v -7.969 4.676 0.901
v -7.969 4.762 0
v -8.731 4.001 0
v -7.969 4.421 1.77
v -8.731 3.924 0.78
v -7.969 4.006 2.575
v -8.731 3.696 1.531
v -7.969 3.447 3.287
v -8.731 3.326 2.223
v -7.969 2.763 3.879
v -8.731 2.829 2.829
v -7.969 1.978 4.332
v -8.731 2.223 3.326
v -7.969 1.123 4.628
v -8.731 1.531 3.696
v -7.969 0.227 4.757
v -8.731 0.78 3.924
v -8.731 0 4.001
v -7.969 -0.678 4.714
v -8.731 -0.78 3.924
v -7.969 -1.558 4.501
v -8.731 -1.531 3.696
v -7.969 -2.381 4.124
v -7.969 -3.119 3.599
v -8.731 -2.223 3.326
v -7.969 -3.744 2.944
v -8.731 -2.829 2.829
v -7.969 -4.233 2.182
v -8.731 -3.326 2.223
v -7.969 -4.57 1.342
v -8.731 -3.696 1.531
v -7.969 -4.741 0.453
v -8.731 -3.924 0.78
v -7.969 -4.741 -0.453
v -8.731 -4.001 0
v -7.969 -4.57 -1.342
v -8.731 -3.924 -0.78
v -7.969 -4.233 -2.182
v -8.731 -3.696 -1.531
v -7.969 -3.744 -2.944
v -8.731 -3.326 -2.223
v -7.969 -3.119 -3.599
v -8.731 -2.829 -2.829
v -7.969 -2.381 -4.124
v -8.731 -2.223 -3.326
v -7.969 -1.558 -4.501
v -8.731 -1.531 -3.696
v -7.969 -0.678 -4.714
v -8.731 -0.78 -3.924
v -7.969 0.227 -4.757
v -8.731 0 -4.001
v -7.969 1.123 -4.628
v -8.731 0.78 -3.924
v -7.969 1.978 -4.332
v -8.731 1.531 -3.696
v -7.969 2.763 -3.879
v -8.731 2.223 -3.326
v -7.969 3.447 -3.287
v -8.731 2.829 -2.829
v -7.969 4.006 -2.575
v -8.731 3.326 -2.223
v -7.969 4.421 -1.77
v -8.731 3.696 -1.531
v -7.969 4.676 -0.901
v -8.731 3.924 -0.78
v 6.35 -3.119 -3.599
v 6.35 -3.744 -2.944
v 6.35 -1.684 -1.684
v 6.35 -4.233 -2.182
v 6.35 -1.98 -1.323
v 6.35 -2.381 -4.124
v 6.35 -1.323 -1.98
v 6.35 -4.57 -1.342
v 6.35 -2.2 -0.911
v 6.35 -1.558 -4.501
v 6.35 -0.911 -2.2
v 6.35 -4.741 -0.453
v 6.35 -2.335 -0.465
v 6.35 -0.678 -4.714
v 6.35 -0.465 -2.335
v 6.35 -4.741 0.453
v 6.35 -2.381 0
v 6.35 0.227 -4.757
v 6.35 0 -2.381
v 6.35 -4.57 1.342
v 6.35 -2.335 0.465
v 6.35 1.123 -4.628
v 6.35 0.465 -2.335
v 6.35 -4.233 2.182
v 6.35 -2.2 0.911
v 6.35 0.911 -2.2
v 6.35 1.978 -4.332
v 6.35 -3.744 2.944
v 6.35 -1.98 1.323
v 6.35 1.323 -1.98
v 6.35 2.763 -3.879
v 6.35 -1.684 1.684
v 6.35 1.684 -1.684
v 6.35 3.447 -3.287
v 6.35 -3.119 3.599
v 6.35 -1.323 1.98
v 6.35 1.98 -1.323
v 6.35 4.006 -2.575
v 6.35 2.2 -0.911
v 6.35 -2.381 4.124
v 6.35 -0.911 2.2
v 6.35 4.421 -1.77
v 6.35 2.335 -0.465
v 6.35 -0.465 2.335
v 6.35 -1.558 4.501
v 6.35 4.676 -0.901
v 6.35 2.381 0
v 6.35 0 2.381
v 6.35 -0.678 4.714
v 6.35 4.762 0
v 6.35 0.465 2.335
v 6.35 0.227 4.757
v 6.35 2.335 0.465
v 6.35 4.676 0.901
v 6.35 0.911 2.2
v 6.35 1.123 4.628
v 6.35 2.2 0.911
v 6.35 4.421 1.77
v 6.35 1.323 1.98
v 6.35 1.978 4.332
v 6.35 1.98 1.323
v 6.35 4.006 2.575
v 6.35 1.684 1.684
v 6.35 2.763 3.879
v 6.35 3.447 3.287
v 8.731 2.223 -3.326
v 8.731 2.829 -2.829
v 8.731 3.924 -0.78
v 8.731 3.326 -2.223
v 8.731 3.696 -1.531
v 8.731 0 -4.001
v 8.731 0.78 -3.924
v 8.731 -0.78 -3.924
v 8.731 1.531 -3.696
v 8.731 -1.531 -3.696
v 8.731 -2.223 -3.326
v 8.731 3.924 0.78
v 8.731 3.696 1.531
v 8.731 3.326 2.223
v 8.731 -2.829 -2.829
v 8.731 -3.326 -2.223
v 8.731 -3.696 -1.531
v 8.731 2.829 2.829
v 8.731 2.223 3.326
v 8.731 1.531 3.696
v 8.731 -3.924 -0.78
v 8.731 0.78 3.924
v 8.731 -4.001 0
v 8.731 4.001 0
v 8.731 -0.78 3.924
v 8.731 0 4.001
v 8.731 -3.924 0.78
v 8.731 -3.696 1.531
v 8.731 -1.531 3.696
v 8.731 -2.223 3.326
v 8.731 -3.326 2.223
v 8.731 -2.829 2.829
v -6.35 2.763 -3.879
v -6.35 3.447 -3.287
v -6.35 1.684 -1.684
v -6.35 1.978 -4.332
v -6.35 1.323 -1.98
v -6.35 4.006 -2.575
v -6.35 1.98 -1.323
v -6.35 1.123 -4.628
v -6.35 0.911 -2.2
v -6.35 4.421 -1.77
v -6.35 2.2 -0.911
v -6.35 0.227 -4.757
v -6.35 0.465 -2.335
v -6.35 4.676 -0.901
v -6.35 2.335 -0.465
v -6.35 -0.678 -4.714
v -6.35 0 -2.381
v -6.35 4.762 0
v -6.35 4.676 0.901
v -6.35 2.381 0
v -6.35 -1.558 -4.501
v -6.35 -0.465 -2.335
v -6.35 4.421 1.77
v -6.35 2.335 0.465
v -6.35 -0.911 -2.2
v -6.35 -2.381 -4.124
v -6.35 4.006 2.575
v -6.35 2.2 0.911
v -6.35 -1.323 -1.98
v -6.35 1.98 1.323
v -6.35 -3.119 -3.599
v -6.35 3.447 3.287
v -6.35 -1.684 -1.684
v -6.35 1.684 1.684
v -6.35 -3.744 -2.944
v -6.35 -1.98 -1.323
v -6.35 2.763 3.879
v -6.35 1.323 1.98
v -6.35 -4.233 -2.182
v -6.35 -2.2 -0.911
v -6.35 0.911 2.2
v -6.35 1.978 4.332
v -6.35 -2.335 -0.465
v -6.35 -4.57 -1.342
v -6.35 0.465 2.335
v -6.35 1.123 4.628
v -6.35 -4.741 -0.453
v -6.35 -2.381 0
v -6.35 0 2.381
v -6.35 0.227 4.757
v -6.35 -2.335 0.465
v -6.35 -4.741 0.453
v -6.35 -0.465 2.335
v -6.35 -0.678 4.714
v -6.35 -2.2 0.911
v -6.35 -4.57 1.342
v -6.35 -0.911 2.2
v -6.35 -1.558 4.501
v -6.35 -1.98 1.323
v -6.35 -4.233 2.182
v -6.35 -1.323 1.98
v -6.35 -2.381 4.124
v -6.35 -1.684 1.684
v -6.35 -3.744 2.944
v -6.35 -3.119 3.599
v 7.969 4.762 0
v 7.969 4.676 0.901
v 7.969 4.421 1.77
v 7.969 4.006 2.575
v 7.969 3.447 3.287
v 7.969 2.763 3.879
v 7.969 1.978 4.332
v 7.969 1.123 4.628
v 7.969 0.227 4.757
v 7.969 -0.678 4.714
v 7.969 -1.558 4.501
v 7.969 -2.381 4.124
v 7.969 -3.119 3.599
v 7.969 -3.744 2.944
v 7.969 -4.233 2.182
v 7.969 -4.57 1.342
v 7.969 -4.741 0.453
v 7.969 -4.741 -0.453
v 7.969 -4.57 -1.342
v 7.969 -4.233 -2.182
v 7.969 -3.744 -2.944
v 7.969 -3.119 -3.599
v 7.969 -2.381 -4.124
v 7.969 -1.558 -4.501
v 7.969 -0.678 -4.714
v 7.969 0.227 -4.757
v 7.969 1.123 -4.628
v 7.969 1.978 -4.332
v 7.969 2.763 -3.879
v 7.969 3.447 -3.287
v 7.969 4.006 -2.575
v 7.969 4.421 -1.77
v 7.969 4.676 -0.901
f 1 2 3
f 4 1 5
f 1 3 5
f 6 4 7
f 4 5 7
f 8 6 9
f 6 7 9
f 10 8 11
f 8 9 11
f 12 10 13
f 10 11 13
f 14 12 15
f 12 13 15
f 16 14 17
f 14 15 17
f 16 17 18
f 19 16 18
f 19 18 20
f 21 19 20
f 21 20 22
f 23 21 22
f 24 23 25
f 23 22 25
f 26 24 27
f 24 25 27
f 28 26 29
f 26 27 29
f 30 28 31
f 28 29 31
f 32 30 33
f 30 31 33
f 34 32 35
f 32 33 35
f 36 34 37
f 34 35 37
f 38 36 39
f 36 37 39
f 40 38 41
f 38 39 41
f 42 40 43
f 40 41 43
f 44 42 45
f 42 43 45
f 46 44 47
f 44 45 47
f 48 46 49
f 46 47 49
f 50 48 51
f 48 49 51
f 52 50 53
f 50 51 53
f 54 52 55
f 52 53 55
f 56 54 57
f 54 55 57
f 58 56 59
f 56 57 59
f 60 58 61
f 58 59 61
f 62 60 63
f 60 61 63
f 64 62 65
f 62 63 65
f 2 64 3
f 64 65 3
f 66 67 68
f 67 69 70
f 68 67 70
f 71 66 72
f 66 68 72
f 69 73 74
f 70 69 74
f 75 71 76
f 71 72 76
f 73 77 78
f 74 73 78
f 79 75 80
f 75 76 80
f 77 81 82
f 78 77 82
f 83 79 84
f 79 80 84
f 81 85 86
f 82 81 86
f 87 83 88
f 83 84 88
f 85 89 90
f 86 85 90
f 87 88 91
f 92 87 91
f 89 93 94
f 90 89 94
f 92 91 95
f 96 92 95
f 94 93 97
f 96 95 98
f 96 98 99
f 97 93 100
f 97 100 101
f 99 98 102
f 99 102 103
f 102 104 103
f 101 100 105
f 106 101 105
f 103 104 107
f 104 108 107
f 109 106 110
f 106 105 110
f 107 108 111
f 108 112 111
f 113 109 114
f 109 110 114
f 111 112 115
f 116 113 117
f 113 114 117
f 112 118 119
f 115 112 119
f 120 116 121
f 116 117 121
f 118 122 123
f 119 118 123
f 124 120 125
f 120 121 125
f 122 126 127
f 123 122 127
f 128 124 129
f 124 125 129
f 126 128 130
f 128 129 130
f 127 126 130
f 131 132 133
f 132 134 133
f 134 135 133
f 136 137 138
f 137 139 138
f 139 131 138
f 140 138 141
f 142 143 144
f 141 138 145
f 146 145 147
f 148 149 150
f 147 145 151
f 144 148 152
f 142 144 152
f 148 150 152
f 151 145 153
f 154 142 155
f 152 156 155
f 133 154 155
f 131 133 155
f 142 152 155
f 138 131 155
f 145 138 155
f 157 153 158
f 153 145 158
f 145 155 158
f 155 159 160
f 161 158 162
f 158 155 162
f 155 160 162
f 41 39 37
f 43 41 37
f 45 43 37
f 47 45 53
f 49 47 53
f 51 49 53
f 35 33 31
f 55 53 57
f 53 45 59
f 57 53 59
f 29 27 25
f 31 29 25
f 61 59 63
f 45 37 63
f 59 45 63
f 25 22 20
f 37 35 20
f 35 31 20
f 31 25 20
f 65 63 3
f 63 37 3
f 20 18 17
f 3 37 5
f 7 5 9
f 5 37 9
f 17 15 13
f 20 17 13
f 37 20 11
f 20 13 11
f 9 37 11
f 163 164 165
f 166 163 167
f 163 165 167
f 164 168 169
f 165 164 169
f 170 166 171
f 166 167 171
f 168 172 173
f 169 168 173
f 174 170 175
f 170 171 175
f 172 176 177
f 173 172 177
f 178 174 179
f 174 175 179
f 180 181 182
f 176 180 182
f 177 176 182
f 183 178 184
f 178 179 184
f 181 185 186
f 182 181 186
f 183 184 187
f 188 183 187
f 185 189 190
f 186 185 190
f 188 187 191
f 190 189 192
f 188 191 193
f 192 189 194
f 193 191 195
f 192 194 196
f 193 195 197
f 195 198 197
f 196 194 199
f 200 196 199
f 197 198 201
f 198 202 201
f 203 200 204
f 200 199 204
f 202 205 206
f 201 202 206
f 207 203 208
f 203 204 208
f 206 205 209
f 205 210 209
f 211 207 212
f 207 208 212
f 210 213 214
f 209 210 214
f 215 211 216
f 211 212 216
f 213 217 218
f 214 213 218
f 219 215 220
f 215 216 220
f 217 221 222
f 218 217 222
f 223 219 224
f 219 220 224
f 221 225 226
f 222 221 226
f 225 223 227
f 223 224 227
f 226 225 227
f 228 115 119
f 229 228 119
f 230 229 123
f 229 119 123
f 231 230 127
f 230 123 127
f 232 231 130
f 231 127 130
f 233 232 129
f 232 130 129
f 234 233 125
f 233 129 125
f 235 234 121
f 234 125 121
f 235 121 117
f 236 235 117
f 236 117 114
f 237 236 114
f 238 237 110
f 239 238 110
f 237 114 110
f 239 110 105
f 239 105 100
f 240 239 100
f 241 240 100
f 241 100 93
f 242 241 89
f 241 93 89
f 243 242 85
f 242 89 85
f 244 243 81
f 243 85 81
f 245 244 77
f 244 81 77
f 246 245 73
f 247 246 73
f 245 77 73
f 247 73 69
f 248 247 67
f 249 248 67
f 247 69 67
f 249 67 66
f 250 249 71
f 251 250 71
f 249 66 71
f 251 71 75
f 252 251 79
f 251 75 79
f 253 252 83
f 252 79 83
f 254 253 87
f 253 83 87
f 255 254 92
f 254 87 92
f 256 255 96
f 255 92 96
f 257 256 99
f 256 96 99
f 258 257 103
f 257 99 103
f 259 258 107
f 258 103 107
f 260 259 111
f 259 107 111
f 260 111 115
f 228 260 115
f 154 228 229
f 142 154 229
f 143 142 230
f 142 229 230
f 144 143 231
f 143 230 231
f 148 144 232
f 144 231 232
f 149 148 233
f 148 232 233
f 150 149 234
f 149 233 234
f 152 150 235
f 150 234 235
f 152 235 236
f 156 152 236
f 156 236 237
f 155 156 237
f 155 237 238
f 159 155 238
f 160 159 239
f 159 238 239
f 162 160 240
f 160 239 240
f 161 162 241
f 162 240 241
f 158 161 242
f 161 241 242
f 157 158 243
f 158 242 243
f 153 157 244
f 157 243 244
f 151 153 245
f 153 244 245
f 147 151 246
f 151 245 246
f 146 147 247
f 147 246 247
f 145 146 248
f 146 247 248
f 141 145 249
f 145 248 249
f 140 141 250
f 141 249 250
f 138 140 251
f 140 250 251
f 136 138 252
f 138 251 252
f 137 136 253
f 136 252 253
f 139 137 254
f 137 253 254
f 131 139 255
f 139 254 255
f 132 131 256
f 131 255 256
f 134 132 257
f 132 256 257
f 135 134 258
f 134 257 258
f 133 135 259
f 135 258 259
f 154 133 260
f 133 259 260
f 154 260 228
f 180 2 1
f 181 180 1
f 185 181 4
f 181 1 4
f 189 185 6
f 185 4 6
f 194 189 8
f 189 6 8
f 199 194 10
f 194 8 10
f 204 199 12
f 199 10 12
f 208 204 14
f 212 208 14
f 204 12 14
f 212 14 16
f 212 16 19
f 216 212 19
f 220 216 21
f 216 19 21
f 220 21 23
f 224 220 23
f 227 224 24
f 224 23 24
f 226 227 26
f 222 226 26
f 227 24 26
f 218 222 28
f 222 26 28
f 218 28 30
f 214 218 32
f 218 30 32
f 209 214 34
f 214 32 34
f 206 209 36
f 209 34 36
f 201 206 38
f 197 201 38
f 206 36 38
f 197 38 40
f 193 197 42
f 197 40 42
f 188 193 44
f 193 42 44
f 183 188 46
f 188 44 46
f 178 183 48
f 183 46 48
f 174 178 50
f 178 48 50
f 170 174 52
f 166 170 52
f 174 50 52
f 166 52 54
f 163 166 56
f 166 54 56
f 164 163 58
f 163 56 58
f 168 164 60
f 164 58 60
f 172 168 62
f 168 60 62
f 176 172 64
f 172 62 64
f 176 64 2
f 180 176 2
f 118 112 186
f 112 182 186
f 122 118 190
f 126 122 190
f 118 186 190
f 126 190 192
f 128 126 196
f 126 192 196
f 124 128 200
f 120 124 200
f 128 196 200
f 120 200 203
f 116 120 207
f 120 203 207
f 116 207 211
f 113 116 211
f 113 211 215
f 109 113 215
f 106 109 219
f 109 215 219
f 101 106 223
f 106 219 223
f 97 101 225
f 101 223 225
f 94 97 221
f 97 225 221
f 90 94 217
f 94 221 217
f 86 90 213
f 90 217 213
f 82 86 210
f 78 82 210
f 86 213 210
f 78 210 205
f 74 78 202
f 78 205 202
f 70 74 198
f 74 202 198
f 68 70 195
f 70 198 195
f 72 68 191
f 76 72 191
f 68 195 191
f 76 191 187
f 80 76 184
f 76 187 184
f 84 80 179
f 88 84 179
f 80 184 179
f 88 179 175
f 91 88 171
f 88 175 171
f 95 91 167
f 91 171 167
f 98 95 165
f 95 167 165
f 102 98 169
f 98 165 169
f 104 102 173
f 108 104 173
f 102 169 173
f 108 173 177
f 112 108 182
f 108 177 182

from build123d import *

# Parameters (mm, degrees)
CHAMFER1_SIZE = 0.762


with BuildPart() as part:
    # Sketch1 → Base-Revolve (revolve)
    with BuildSketch(Plane.XY):
        Polygon((8.73125, 0), (8.73125, 4.7625), (6.35, 4.7625), (6.35, 2.38125), (-6.35, 2.38125), (-6.35, 4.7625), (-8.73125, 4.7625), (-8.73125, 0), align=None)
    revolve(axis=Axis((0, 0, 0), (1, 0, 0)))

    # Chamfer1
    chamfer1_edges = [part.edges().sort_by_distance(p)[0] for p in [
        (8.73125, -4.7625, 0),
        (-8.73125, -4.7625, 0),
    ]]
    chamfer(chamfer1_edges, length=CHAMFER1_SIZE)


solid = part.part
